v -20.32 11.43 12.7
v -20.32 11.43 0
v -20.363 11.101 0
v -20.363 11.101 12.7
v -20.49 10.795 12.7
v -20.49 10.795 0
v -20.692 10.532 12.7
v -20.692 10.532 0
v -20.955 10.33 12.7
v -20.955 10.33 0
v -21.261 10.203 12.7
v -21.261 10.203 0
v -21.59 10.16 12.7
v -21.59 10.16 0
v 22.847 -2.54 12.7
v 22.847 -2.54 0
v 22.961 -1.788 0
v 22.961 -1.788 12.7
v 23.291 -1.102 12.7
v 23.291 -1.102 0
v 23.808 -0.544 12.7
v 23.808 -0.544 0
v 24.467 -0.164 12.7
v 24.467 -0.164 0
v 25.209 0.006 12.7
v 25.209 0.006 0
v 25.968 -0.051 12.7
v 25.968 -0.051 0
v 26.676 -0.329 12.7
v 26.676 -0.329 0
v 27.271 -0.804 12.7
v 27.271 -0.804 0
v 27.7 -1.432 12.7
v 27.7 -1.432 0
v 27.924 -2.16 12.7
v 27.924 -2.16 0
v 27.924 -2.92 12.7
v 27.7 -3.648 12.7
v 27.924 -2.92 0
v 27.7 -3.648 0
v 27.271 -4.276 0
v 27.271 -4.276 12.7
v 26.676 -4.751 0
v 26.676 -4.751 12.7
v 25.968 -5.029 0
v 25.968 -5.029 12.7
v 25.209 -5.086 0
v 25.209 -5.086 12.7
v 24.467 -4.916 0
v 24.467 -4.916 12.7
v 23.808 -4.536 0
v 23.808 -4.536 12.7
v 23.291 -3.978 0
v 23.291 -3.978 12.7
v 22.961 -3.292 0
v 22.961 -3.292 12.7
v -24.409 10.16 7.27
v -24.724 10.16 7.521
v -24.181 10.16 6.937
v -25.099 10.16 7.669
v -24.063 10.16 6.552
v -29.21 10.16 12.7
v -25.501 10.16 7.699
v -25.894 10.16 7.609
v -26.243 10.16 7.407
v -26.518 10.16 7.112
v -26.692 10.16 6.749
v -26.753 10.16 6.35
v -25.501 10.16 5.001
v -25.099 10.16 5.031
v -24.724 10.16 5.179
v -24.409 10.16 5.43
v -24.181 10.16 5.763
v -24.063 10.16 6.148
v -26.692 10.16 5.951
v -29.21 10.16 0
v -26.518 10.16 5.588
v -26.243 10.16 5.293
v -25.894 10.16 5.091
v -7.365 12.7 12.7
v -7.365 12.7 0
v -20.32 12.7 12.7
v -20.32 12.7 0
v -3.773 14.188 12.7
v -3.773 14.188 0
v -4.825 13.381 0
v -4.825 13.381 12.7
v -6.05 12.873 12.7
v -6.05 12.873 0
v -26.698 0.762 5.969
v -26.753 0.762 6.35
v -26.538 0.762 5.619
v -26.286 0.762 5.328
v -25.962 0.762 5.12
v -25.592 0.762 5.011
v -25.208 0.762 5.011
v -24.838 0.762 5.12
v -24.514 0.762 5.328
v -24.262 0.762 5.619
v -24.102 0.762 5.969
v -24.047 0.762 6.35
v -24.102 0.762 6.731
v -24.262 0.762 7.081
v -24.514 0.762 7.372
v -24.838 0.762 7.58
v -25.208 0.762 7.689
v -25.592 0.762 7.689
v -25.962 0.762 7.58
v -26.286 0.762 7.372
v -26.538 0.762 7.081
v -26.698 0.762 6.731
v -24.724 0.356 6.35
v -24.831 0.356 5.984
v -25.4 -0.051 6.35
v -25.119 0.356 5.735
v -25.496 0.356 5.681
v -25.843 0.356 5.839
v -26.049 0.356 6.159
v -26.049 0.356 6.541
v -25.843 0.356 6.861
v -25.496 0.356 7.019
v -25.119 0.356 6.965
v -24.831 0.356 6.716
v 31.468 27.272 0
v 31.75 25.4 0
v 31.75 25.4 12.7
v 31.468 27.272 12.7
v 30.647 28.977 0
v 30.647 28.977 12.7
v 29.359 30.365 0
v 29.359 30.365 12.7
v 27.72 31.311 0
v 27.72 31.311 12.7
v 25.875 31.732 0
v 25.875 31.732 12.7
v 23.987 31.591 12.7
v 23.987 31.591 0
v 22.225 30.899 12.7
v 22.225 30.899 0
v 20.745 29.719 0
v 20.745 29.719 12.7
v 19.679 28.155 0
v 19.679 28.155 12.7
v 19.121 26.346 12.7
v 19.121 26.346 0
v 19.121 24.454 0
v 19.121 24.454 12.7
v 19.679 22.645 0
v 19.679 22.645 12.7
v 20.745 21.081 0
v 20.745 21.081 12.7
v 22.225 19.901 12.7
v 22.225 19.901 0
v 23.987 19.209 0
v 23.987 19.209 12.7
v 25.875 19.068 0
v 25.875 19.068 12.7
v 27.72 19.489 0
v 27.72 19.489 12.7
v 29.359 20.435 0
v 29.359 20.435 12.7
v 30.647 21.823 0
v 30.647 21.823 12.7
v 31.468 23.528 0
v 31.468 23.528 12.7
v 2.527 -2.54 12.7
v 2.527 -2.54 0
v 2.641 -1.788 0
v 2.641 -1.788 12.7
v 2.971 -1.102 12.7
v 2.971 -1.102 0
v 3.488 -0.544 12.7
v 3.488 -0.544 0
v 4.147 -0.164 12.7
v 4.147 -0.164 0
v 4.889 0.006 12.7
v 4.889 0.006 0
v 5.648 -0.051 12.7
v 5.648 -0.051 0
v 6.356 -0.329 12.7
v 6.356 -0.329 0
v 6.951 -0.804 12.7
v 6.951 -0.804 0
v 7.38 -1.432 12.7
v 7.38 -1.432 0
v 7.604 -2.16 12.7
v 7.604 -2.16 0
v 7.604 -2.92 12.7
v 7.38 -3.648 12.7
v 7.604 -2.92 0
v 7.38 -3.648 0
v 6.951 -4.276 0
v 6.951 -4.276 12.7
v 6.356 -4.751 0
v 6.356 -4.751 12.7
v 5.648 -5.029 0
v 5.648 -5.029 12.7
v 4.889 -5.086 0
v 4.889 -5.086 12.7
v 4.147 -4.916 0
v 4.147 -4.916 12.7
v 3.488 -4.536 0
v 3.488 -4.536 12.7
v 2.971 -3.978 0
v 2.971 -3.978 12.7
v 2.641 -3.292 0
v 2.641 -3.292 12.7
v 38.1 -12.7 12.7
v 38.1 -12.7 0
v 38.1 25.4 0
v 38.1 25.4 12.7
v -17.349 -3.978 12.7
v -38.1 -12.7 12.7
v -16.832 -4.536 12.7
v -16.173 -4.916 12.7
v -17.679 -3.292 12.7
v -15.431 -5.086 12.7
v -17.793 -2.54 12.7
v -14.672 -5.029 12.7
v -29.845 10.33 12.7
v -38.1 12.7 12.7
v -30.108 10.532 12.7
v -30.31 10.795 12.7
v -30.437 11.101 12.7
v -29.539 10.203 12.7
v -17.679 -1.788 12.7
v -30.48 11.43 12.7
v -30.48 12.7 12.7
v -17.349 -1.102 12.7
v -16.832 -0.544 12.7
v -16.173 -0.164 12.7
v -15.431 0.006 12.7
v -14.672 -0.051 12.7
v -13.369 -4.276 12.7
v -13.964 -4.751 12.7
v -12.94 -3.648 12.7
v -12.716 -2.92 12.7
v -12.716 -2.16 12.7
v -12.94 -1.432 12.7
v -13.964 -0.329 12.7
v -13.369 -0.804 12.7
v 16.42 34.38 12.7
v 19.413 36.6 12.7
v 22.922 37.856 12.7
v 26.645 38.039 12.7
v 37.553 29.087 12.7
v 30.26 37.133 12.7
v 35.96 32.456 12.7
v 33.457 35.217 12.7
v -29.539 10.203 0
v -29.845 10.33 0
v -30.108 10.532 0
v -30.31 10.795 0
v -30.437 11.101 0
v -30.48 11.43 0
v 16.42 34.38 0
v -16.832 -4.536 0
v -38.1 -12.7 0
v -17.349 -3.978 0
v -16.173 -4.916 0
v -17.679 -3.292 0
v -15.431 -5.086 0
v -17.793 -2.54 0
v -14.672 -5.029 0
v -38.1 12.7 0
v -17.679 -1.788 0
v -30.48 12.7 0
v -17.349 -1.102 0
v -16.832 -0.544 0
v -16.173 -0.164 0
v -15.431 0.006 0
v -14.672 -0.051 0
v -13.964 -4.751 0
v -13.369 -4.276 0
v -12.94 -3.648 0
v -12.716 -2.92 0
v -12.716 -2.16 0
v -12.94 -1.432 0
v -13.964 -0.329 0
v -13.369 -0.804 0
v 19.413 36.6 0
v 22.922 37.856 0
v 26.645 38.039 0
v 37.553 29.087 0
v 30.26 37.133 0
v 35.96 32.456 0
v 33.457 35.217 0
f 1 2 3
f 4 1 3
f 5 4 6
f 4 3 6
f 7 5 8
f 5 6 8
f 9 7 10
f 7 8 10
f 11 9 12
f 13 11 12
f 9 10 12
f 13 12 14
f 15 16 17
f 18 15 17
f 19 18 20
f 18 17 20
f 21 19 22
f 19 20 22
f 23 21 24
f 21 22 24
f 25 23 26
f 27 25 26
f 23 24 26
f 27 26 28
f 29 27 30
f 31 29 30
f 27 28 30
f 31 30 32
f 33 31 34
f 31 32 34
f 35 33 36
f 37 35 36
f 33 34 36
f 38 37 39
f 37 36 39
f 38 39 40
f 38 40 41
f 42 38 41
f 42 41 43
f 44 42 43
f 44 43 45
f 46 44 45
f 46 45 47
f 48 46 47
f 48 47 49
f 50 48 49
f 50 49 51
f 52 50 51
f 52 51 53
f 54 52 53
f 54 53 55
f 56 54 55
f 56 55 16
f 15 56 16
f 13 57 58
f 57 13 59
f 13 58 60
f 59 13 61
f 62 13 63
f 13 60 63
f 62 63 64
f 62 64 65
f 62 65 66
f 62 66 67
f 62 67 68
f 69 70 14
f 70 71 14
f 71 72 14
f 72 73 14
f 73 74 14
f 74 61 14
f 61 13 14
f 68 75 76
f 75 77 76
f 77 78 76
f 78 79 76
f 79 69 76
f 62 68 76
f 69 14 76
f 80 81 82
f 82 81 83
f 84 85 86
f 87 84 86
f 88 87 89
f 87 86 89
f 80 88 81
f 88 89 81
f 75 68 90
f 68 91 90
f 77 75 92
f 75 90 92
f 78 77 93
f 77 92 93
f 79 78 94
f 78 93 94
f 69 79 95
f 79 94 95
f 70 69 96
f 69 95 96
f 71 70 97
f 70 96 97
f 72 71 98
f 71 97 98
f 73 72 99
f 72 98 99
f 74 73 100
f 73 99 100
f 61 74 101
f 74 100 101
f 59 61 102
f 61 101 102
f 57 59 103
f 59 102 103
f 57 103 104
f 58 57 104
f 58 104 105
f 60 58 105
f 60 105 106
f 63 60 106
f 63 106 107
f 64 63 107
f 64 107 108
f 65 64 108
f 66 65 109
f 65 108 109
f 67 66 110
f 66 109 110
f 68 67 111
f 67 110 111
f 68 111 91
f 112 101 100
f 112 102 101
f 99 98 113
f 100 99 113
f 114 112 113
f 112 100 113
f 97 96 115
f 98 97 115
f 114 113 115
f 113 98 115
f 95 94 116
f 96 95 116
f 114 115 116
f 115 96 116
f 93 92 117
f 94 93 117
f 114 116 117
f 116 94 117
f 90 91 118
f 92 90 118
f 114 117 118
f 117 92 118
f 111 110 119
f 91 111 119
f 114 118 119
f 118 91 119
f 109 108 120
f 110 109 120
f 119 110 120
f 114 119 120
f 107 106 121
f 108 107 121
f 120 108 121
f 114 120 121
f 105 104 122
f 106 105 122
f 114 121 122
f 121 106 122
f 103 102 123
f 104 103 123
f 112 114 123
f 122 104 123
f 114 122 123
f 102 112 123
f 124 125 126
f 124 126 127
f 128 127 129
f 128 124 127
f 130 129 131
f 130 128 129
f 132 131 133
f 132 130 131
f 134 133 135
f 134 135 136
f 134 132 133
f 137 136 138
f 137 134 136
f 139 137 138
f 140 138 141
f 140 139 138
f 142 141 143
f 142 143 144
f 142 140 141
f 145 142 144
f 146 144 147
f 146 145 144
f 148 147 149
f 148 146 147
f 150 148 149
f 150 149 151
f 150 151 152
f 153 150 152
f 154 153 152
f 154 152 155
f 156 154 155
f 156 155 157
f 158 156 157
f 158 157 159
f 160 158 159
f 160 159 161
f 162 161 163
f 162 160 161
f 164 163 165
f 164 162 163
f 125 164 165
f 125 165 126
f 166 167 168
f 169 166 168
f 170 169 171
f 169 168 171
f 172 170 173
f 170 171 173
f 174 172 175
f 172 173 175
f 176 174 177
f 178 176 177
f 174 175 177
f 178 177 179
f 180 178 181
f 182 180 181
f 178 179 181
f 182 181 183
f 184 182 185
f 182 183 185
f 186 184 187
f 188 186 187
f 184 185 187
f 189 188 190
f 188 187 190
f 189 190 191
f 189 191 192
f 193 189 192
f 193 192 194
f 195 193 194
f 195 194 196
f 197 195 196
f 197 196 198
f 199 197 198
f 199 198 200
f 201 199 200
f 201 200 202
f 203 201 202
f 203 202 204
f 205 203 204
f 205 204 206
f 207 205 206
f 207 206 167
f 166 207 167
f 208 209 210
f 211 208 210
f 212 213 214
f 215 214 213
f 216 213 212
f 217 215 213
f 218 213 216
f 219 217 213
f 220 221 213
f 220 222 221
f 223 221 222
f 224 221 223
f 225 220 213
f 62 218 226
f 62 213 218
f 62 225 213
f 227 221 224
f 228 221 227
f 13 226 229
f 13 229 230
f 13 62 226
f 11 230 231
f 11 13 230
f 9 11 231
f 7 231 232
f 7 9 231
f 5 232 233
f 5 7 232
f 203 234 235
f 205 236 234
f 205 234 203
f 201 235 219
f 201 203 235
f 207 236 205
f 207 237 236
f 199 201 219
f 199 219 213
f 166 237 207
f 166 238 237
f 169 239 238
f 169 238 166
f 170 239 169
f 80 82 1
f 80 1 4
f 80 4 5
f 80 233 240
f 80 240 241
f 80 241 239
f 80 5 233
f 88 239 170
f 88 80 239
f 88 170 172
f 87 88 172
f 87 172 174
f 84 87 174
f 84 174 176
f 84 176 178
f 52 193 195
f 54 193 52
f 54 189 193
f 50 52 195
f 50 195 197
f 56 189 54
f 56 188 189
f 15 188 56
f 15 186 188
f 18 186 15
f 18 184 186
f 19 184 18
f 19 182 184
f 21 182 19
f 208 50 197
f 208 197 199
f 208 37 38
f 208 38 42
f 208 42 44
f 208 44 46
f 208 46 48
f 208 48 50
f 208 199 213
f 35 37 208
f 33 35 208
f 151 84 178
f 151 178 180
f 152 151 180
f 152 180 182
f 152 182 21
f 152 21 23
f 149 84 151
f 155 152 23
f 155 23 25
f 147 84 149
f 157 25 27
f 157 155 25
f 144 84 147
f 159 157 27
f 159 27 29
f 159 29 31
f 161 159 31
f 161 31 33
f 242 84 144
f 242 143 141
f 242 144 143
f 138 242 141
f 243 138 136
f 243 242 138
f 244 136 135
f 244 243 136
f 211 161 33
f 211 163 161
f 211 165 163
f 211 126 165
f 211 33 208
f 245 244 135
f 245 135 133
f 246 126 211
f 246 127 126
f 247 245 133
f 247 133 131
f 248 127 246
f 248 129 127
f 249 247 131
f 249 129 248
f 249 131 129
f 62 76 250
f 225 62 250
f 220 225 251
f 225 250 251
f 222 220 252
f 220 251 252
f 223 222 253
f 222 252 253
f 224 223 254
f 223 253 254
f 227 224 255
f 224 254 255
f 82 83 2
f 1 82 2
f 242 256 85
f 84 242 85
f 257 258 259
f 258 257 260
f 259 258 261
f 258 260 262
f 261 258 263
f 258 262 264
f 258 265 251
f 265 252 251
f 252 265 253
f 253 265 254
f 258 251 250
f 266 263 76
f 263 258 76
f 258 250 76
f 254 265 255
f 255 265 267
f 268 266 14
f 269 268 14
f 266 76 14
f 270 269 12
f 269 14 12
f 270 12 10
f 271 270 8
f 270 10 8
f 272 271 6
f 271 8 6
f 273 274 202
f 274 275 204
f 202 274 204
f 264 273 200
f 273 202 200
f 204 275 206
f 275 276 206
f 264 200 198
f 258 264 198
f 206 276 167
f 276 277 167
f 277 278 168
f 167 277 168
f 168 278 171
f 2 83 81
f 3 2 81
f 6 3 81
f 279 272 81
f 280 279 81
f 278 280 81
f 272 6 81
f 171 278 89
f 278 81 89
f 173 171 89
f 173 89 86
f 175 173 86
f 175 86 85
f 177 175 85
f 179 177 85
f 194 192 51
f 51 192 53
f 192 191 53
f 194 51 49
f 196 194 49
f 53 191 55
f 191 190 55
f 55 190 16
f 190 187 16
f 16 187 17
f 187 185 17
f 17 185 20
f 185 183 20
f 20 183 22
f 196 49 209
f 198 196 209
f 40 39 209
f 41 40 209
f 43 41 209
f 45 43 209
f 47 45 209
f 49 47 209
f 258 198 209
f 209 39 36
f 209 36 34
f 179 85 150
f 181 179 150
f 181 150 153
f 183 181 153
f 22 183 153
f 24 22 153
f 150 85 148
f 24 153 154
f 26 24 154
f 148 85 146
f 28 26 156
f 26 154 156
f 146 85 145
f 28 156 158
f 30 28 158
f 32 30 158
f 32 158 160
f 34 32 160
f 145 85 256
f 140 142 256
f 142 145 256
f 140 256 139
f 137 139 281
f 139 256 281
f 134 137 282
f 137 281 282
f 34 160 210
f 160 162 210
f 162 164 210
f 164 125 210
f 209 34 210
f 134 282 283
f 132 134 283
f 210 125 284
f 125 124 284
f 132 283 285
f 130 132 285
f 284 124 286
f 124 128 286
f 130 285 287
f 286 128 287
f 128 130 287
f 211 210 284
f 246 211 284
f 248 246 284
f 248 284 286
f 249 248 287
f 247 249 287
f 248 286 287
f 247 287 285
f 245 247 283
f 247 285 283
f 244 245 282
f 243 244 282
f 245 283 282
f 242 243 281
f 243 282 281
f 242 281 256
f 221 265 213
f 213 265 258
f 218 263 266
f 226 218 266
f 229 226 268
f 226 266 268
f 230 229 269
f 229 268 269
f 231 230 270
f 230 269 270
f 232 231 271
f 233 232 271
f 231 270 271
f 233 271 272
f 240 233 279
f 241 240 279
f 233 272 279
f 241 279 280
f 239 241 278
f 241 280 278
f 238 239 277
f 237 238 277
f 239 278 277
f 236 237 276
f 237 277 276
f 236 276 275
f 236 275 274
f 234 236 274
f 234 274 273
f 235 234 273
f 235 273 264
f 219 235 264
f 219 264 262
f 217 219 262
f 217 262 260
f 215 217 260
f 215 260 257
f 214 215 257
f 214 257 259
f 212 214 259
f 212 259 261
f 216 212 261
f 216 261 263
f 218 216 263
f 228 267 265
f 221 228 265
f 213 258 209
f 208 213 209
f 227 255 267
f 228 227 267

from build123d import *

# Parameters (mm, degrees)
SKETCH1_R                 = 6.35
BOSS_EXTRUDE1_DEPTH       = 12.7
F_1_4_20_TAPPED_HOLE1_D   = 5.1054
F_6_32_TAPPED_HOLE1_D     = 2.7051
F_6_32_TAPPED_HOLE1_DEPTH = 9.398
F_6_32_TAPPED_HOLE1_TIP   = 0.81269403


with BuildPart() as part:
    # Sketch1 → Boss-Extrude1 (new body)
    with BuildSketch(Plane.XY):
        with BuildLine():
            Line((38.1, 12.7), (38.1, 25.4))
            ThreePointArc((38.1, 25.4), (30.260079591, 37.133270063), (16.419743879, 34.380256121))
            Line((16.419743879, 34.380256121), (-3.772614691, 14.187897552))
            ThreePointArc((-3.772614691, 14.187897552), (-5.420685303, 13.086691975), (-7.364717139, 12.7))
            Line((-7.364717139, 12.7), (-20.32, 12.7))
            Line((-20.32, 12.7), (-20.32, 11.43))
            ThreePointArc((-20.32, 11.43), (-20.691974388, 10.531974388), (-21.59, 10.16))
            Line((-21.59, 10.16), (-29.21, 10.16))
            ThreePointArc((-29.21, 10.16), (-30.108025612, 10.531974388), (-30.48, 11.43))
            Line((-30.48, 11.43), (-30.48, 12.7))
            Line((-30.48, 12.7), (-38.1, 12.7))
            Line((-38.1, 12.7), (-38.1, -12.7))
            Line((-38.1, -12.7), (38.1, -12.7))
            Line((38.1, -12.7), (38.1, 12.7))
        make_face()
        with Locations((25.4, 25.4)):
            Circle(SKETCH1_R, mode=Mode.SUBTRACT)
    extrude(amount=BOSS_EXTRUDE1_DEPTH)

    # 1/4-20 Tapped Hole1 (through all)
    with Locations(Plane.XY.offset(12.7)):
        with Locations((-15.24, -2.54), (5.08, -2.54), (25.4, -2.54)):
            Hole(F_1_4_20_TAPPED_HOLE1_D / 2)

    # #6-32 Tapped Hole1
    with Locations(Plane(origin=(0, 10.16, 0), x_dir=(1, 0, 0), z_dir=(0, 1, 0))):
        with Locations((-25.4, -6.35)):
            Hole(F_6_32_TAPPED_HOLE1_D / 2, depth=F_6_32_TAPPED_HOLE1_DEPTH)
            with Locations((0, 0, -(F_6_32_TAPPED_HOLE1_DEPTH + F_6_32_TAPPED_HOLE1_TIP / 2))):  # 118° drill point
                Cone(0, F_6_32_TAPPED_HOLE1_D / 2, F_6_32_TAPPED_HOLE1_TIP, mode=Mode.SUBTRACT)


solid = part.part
